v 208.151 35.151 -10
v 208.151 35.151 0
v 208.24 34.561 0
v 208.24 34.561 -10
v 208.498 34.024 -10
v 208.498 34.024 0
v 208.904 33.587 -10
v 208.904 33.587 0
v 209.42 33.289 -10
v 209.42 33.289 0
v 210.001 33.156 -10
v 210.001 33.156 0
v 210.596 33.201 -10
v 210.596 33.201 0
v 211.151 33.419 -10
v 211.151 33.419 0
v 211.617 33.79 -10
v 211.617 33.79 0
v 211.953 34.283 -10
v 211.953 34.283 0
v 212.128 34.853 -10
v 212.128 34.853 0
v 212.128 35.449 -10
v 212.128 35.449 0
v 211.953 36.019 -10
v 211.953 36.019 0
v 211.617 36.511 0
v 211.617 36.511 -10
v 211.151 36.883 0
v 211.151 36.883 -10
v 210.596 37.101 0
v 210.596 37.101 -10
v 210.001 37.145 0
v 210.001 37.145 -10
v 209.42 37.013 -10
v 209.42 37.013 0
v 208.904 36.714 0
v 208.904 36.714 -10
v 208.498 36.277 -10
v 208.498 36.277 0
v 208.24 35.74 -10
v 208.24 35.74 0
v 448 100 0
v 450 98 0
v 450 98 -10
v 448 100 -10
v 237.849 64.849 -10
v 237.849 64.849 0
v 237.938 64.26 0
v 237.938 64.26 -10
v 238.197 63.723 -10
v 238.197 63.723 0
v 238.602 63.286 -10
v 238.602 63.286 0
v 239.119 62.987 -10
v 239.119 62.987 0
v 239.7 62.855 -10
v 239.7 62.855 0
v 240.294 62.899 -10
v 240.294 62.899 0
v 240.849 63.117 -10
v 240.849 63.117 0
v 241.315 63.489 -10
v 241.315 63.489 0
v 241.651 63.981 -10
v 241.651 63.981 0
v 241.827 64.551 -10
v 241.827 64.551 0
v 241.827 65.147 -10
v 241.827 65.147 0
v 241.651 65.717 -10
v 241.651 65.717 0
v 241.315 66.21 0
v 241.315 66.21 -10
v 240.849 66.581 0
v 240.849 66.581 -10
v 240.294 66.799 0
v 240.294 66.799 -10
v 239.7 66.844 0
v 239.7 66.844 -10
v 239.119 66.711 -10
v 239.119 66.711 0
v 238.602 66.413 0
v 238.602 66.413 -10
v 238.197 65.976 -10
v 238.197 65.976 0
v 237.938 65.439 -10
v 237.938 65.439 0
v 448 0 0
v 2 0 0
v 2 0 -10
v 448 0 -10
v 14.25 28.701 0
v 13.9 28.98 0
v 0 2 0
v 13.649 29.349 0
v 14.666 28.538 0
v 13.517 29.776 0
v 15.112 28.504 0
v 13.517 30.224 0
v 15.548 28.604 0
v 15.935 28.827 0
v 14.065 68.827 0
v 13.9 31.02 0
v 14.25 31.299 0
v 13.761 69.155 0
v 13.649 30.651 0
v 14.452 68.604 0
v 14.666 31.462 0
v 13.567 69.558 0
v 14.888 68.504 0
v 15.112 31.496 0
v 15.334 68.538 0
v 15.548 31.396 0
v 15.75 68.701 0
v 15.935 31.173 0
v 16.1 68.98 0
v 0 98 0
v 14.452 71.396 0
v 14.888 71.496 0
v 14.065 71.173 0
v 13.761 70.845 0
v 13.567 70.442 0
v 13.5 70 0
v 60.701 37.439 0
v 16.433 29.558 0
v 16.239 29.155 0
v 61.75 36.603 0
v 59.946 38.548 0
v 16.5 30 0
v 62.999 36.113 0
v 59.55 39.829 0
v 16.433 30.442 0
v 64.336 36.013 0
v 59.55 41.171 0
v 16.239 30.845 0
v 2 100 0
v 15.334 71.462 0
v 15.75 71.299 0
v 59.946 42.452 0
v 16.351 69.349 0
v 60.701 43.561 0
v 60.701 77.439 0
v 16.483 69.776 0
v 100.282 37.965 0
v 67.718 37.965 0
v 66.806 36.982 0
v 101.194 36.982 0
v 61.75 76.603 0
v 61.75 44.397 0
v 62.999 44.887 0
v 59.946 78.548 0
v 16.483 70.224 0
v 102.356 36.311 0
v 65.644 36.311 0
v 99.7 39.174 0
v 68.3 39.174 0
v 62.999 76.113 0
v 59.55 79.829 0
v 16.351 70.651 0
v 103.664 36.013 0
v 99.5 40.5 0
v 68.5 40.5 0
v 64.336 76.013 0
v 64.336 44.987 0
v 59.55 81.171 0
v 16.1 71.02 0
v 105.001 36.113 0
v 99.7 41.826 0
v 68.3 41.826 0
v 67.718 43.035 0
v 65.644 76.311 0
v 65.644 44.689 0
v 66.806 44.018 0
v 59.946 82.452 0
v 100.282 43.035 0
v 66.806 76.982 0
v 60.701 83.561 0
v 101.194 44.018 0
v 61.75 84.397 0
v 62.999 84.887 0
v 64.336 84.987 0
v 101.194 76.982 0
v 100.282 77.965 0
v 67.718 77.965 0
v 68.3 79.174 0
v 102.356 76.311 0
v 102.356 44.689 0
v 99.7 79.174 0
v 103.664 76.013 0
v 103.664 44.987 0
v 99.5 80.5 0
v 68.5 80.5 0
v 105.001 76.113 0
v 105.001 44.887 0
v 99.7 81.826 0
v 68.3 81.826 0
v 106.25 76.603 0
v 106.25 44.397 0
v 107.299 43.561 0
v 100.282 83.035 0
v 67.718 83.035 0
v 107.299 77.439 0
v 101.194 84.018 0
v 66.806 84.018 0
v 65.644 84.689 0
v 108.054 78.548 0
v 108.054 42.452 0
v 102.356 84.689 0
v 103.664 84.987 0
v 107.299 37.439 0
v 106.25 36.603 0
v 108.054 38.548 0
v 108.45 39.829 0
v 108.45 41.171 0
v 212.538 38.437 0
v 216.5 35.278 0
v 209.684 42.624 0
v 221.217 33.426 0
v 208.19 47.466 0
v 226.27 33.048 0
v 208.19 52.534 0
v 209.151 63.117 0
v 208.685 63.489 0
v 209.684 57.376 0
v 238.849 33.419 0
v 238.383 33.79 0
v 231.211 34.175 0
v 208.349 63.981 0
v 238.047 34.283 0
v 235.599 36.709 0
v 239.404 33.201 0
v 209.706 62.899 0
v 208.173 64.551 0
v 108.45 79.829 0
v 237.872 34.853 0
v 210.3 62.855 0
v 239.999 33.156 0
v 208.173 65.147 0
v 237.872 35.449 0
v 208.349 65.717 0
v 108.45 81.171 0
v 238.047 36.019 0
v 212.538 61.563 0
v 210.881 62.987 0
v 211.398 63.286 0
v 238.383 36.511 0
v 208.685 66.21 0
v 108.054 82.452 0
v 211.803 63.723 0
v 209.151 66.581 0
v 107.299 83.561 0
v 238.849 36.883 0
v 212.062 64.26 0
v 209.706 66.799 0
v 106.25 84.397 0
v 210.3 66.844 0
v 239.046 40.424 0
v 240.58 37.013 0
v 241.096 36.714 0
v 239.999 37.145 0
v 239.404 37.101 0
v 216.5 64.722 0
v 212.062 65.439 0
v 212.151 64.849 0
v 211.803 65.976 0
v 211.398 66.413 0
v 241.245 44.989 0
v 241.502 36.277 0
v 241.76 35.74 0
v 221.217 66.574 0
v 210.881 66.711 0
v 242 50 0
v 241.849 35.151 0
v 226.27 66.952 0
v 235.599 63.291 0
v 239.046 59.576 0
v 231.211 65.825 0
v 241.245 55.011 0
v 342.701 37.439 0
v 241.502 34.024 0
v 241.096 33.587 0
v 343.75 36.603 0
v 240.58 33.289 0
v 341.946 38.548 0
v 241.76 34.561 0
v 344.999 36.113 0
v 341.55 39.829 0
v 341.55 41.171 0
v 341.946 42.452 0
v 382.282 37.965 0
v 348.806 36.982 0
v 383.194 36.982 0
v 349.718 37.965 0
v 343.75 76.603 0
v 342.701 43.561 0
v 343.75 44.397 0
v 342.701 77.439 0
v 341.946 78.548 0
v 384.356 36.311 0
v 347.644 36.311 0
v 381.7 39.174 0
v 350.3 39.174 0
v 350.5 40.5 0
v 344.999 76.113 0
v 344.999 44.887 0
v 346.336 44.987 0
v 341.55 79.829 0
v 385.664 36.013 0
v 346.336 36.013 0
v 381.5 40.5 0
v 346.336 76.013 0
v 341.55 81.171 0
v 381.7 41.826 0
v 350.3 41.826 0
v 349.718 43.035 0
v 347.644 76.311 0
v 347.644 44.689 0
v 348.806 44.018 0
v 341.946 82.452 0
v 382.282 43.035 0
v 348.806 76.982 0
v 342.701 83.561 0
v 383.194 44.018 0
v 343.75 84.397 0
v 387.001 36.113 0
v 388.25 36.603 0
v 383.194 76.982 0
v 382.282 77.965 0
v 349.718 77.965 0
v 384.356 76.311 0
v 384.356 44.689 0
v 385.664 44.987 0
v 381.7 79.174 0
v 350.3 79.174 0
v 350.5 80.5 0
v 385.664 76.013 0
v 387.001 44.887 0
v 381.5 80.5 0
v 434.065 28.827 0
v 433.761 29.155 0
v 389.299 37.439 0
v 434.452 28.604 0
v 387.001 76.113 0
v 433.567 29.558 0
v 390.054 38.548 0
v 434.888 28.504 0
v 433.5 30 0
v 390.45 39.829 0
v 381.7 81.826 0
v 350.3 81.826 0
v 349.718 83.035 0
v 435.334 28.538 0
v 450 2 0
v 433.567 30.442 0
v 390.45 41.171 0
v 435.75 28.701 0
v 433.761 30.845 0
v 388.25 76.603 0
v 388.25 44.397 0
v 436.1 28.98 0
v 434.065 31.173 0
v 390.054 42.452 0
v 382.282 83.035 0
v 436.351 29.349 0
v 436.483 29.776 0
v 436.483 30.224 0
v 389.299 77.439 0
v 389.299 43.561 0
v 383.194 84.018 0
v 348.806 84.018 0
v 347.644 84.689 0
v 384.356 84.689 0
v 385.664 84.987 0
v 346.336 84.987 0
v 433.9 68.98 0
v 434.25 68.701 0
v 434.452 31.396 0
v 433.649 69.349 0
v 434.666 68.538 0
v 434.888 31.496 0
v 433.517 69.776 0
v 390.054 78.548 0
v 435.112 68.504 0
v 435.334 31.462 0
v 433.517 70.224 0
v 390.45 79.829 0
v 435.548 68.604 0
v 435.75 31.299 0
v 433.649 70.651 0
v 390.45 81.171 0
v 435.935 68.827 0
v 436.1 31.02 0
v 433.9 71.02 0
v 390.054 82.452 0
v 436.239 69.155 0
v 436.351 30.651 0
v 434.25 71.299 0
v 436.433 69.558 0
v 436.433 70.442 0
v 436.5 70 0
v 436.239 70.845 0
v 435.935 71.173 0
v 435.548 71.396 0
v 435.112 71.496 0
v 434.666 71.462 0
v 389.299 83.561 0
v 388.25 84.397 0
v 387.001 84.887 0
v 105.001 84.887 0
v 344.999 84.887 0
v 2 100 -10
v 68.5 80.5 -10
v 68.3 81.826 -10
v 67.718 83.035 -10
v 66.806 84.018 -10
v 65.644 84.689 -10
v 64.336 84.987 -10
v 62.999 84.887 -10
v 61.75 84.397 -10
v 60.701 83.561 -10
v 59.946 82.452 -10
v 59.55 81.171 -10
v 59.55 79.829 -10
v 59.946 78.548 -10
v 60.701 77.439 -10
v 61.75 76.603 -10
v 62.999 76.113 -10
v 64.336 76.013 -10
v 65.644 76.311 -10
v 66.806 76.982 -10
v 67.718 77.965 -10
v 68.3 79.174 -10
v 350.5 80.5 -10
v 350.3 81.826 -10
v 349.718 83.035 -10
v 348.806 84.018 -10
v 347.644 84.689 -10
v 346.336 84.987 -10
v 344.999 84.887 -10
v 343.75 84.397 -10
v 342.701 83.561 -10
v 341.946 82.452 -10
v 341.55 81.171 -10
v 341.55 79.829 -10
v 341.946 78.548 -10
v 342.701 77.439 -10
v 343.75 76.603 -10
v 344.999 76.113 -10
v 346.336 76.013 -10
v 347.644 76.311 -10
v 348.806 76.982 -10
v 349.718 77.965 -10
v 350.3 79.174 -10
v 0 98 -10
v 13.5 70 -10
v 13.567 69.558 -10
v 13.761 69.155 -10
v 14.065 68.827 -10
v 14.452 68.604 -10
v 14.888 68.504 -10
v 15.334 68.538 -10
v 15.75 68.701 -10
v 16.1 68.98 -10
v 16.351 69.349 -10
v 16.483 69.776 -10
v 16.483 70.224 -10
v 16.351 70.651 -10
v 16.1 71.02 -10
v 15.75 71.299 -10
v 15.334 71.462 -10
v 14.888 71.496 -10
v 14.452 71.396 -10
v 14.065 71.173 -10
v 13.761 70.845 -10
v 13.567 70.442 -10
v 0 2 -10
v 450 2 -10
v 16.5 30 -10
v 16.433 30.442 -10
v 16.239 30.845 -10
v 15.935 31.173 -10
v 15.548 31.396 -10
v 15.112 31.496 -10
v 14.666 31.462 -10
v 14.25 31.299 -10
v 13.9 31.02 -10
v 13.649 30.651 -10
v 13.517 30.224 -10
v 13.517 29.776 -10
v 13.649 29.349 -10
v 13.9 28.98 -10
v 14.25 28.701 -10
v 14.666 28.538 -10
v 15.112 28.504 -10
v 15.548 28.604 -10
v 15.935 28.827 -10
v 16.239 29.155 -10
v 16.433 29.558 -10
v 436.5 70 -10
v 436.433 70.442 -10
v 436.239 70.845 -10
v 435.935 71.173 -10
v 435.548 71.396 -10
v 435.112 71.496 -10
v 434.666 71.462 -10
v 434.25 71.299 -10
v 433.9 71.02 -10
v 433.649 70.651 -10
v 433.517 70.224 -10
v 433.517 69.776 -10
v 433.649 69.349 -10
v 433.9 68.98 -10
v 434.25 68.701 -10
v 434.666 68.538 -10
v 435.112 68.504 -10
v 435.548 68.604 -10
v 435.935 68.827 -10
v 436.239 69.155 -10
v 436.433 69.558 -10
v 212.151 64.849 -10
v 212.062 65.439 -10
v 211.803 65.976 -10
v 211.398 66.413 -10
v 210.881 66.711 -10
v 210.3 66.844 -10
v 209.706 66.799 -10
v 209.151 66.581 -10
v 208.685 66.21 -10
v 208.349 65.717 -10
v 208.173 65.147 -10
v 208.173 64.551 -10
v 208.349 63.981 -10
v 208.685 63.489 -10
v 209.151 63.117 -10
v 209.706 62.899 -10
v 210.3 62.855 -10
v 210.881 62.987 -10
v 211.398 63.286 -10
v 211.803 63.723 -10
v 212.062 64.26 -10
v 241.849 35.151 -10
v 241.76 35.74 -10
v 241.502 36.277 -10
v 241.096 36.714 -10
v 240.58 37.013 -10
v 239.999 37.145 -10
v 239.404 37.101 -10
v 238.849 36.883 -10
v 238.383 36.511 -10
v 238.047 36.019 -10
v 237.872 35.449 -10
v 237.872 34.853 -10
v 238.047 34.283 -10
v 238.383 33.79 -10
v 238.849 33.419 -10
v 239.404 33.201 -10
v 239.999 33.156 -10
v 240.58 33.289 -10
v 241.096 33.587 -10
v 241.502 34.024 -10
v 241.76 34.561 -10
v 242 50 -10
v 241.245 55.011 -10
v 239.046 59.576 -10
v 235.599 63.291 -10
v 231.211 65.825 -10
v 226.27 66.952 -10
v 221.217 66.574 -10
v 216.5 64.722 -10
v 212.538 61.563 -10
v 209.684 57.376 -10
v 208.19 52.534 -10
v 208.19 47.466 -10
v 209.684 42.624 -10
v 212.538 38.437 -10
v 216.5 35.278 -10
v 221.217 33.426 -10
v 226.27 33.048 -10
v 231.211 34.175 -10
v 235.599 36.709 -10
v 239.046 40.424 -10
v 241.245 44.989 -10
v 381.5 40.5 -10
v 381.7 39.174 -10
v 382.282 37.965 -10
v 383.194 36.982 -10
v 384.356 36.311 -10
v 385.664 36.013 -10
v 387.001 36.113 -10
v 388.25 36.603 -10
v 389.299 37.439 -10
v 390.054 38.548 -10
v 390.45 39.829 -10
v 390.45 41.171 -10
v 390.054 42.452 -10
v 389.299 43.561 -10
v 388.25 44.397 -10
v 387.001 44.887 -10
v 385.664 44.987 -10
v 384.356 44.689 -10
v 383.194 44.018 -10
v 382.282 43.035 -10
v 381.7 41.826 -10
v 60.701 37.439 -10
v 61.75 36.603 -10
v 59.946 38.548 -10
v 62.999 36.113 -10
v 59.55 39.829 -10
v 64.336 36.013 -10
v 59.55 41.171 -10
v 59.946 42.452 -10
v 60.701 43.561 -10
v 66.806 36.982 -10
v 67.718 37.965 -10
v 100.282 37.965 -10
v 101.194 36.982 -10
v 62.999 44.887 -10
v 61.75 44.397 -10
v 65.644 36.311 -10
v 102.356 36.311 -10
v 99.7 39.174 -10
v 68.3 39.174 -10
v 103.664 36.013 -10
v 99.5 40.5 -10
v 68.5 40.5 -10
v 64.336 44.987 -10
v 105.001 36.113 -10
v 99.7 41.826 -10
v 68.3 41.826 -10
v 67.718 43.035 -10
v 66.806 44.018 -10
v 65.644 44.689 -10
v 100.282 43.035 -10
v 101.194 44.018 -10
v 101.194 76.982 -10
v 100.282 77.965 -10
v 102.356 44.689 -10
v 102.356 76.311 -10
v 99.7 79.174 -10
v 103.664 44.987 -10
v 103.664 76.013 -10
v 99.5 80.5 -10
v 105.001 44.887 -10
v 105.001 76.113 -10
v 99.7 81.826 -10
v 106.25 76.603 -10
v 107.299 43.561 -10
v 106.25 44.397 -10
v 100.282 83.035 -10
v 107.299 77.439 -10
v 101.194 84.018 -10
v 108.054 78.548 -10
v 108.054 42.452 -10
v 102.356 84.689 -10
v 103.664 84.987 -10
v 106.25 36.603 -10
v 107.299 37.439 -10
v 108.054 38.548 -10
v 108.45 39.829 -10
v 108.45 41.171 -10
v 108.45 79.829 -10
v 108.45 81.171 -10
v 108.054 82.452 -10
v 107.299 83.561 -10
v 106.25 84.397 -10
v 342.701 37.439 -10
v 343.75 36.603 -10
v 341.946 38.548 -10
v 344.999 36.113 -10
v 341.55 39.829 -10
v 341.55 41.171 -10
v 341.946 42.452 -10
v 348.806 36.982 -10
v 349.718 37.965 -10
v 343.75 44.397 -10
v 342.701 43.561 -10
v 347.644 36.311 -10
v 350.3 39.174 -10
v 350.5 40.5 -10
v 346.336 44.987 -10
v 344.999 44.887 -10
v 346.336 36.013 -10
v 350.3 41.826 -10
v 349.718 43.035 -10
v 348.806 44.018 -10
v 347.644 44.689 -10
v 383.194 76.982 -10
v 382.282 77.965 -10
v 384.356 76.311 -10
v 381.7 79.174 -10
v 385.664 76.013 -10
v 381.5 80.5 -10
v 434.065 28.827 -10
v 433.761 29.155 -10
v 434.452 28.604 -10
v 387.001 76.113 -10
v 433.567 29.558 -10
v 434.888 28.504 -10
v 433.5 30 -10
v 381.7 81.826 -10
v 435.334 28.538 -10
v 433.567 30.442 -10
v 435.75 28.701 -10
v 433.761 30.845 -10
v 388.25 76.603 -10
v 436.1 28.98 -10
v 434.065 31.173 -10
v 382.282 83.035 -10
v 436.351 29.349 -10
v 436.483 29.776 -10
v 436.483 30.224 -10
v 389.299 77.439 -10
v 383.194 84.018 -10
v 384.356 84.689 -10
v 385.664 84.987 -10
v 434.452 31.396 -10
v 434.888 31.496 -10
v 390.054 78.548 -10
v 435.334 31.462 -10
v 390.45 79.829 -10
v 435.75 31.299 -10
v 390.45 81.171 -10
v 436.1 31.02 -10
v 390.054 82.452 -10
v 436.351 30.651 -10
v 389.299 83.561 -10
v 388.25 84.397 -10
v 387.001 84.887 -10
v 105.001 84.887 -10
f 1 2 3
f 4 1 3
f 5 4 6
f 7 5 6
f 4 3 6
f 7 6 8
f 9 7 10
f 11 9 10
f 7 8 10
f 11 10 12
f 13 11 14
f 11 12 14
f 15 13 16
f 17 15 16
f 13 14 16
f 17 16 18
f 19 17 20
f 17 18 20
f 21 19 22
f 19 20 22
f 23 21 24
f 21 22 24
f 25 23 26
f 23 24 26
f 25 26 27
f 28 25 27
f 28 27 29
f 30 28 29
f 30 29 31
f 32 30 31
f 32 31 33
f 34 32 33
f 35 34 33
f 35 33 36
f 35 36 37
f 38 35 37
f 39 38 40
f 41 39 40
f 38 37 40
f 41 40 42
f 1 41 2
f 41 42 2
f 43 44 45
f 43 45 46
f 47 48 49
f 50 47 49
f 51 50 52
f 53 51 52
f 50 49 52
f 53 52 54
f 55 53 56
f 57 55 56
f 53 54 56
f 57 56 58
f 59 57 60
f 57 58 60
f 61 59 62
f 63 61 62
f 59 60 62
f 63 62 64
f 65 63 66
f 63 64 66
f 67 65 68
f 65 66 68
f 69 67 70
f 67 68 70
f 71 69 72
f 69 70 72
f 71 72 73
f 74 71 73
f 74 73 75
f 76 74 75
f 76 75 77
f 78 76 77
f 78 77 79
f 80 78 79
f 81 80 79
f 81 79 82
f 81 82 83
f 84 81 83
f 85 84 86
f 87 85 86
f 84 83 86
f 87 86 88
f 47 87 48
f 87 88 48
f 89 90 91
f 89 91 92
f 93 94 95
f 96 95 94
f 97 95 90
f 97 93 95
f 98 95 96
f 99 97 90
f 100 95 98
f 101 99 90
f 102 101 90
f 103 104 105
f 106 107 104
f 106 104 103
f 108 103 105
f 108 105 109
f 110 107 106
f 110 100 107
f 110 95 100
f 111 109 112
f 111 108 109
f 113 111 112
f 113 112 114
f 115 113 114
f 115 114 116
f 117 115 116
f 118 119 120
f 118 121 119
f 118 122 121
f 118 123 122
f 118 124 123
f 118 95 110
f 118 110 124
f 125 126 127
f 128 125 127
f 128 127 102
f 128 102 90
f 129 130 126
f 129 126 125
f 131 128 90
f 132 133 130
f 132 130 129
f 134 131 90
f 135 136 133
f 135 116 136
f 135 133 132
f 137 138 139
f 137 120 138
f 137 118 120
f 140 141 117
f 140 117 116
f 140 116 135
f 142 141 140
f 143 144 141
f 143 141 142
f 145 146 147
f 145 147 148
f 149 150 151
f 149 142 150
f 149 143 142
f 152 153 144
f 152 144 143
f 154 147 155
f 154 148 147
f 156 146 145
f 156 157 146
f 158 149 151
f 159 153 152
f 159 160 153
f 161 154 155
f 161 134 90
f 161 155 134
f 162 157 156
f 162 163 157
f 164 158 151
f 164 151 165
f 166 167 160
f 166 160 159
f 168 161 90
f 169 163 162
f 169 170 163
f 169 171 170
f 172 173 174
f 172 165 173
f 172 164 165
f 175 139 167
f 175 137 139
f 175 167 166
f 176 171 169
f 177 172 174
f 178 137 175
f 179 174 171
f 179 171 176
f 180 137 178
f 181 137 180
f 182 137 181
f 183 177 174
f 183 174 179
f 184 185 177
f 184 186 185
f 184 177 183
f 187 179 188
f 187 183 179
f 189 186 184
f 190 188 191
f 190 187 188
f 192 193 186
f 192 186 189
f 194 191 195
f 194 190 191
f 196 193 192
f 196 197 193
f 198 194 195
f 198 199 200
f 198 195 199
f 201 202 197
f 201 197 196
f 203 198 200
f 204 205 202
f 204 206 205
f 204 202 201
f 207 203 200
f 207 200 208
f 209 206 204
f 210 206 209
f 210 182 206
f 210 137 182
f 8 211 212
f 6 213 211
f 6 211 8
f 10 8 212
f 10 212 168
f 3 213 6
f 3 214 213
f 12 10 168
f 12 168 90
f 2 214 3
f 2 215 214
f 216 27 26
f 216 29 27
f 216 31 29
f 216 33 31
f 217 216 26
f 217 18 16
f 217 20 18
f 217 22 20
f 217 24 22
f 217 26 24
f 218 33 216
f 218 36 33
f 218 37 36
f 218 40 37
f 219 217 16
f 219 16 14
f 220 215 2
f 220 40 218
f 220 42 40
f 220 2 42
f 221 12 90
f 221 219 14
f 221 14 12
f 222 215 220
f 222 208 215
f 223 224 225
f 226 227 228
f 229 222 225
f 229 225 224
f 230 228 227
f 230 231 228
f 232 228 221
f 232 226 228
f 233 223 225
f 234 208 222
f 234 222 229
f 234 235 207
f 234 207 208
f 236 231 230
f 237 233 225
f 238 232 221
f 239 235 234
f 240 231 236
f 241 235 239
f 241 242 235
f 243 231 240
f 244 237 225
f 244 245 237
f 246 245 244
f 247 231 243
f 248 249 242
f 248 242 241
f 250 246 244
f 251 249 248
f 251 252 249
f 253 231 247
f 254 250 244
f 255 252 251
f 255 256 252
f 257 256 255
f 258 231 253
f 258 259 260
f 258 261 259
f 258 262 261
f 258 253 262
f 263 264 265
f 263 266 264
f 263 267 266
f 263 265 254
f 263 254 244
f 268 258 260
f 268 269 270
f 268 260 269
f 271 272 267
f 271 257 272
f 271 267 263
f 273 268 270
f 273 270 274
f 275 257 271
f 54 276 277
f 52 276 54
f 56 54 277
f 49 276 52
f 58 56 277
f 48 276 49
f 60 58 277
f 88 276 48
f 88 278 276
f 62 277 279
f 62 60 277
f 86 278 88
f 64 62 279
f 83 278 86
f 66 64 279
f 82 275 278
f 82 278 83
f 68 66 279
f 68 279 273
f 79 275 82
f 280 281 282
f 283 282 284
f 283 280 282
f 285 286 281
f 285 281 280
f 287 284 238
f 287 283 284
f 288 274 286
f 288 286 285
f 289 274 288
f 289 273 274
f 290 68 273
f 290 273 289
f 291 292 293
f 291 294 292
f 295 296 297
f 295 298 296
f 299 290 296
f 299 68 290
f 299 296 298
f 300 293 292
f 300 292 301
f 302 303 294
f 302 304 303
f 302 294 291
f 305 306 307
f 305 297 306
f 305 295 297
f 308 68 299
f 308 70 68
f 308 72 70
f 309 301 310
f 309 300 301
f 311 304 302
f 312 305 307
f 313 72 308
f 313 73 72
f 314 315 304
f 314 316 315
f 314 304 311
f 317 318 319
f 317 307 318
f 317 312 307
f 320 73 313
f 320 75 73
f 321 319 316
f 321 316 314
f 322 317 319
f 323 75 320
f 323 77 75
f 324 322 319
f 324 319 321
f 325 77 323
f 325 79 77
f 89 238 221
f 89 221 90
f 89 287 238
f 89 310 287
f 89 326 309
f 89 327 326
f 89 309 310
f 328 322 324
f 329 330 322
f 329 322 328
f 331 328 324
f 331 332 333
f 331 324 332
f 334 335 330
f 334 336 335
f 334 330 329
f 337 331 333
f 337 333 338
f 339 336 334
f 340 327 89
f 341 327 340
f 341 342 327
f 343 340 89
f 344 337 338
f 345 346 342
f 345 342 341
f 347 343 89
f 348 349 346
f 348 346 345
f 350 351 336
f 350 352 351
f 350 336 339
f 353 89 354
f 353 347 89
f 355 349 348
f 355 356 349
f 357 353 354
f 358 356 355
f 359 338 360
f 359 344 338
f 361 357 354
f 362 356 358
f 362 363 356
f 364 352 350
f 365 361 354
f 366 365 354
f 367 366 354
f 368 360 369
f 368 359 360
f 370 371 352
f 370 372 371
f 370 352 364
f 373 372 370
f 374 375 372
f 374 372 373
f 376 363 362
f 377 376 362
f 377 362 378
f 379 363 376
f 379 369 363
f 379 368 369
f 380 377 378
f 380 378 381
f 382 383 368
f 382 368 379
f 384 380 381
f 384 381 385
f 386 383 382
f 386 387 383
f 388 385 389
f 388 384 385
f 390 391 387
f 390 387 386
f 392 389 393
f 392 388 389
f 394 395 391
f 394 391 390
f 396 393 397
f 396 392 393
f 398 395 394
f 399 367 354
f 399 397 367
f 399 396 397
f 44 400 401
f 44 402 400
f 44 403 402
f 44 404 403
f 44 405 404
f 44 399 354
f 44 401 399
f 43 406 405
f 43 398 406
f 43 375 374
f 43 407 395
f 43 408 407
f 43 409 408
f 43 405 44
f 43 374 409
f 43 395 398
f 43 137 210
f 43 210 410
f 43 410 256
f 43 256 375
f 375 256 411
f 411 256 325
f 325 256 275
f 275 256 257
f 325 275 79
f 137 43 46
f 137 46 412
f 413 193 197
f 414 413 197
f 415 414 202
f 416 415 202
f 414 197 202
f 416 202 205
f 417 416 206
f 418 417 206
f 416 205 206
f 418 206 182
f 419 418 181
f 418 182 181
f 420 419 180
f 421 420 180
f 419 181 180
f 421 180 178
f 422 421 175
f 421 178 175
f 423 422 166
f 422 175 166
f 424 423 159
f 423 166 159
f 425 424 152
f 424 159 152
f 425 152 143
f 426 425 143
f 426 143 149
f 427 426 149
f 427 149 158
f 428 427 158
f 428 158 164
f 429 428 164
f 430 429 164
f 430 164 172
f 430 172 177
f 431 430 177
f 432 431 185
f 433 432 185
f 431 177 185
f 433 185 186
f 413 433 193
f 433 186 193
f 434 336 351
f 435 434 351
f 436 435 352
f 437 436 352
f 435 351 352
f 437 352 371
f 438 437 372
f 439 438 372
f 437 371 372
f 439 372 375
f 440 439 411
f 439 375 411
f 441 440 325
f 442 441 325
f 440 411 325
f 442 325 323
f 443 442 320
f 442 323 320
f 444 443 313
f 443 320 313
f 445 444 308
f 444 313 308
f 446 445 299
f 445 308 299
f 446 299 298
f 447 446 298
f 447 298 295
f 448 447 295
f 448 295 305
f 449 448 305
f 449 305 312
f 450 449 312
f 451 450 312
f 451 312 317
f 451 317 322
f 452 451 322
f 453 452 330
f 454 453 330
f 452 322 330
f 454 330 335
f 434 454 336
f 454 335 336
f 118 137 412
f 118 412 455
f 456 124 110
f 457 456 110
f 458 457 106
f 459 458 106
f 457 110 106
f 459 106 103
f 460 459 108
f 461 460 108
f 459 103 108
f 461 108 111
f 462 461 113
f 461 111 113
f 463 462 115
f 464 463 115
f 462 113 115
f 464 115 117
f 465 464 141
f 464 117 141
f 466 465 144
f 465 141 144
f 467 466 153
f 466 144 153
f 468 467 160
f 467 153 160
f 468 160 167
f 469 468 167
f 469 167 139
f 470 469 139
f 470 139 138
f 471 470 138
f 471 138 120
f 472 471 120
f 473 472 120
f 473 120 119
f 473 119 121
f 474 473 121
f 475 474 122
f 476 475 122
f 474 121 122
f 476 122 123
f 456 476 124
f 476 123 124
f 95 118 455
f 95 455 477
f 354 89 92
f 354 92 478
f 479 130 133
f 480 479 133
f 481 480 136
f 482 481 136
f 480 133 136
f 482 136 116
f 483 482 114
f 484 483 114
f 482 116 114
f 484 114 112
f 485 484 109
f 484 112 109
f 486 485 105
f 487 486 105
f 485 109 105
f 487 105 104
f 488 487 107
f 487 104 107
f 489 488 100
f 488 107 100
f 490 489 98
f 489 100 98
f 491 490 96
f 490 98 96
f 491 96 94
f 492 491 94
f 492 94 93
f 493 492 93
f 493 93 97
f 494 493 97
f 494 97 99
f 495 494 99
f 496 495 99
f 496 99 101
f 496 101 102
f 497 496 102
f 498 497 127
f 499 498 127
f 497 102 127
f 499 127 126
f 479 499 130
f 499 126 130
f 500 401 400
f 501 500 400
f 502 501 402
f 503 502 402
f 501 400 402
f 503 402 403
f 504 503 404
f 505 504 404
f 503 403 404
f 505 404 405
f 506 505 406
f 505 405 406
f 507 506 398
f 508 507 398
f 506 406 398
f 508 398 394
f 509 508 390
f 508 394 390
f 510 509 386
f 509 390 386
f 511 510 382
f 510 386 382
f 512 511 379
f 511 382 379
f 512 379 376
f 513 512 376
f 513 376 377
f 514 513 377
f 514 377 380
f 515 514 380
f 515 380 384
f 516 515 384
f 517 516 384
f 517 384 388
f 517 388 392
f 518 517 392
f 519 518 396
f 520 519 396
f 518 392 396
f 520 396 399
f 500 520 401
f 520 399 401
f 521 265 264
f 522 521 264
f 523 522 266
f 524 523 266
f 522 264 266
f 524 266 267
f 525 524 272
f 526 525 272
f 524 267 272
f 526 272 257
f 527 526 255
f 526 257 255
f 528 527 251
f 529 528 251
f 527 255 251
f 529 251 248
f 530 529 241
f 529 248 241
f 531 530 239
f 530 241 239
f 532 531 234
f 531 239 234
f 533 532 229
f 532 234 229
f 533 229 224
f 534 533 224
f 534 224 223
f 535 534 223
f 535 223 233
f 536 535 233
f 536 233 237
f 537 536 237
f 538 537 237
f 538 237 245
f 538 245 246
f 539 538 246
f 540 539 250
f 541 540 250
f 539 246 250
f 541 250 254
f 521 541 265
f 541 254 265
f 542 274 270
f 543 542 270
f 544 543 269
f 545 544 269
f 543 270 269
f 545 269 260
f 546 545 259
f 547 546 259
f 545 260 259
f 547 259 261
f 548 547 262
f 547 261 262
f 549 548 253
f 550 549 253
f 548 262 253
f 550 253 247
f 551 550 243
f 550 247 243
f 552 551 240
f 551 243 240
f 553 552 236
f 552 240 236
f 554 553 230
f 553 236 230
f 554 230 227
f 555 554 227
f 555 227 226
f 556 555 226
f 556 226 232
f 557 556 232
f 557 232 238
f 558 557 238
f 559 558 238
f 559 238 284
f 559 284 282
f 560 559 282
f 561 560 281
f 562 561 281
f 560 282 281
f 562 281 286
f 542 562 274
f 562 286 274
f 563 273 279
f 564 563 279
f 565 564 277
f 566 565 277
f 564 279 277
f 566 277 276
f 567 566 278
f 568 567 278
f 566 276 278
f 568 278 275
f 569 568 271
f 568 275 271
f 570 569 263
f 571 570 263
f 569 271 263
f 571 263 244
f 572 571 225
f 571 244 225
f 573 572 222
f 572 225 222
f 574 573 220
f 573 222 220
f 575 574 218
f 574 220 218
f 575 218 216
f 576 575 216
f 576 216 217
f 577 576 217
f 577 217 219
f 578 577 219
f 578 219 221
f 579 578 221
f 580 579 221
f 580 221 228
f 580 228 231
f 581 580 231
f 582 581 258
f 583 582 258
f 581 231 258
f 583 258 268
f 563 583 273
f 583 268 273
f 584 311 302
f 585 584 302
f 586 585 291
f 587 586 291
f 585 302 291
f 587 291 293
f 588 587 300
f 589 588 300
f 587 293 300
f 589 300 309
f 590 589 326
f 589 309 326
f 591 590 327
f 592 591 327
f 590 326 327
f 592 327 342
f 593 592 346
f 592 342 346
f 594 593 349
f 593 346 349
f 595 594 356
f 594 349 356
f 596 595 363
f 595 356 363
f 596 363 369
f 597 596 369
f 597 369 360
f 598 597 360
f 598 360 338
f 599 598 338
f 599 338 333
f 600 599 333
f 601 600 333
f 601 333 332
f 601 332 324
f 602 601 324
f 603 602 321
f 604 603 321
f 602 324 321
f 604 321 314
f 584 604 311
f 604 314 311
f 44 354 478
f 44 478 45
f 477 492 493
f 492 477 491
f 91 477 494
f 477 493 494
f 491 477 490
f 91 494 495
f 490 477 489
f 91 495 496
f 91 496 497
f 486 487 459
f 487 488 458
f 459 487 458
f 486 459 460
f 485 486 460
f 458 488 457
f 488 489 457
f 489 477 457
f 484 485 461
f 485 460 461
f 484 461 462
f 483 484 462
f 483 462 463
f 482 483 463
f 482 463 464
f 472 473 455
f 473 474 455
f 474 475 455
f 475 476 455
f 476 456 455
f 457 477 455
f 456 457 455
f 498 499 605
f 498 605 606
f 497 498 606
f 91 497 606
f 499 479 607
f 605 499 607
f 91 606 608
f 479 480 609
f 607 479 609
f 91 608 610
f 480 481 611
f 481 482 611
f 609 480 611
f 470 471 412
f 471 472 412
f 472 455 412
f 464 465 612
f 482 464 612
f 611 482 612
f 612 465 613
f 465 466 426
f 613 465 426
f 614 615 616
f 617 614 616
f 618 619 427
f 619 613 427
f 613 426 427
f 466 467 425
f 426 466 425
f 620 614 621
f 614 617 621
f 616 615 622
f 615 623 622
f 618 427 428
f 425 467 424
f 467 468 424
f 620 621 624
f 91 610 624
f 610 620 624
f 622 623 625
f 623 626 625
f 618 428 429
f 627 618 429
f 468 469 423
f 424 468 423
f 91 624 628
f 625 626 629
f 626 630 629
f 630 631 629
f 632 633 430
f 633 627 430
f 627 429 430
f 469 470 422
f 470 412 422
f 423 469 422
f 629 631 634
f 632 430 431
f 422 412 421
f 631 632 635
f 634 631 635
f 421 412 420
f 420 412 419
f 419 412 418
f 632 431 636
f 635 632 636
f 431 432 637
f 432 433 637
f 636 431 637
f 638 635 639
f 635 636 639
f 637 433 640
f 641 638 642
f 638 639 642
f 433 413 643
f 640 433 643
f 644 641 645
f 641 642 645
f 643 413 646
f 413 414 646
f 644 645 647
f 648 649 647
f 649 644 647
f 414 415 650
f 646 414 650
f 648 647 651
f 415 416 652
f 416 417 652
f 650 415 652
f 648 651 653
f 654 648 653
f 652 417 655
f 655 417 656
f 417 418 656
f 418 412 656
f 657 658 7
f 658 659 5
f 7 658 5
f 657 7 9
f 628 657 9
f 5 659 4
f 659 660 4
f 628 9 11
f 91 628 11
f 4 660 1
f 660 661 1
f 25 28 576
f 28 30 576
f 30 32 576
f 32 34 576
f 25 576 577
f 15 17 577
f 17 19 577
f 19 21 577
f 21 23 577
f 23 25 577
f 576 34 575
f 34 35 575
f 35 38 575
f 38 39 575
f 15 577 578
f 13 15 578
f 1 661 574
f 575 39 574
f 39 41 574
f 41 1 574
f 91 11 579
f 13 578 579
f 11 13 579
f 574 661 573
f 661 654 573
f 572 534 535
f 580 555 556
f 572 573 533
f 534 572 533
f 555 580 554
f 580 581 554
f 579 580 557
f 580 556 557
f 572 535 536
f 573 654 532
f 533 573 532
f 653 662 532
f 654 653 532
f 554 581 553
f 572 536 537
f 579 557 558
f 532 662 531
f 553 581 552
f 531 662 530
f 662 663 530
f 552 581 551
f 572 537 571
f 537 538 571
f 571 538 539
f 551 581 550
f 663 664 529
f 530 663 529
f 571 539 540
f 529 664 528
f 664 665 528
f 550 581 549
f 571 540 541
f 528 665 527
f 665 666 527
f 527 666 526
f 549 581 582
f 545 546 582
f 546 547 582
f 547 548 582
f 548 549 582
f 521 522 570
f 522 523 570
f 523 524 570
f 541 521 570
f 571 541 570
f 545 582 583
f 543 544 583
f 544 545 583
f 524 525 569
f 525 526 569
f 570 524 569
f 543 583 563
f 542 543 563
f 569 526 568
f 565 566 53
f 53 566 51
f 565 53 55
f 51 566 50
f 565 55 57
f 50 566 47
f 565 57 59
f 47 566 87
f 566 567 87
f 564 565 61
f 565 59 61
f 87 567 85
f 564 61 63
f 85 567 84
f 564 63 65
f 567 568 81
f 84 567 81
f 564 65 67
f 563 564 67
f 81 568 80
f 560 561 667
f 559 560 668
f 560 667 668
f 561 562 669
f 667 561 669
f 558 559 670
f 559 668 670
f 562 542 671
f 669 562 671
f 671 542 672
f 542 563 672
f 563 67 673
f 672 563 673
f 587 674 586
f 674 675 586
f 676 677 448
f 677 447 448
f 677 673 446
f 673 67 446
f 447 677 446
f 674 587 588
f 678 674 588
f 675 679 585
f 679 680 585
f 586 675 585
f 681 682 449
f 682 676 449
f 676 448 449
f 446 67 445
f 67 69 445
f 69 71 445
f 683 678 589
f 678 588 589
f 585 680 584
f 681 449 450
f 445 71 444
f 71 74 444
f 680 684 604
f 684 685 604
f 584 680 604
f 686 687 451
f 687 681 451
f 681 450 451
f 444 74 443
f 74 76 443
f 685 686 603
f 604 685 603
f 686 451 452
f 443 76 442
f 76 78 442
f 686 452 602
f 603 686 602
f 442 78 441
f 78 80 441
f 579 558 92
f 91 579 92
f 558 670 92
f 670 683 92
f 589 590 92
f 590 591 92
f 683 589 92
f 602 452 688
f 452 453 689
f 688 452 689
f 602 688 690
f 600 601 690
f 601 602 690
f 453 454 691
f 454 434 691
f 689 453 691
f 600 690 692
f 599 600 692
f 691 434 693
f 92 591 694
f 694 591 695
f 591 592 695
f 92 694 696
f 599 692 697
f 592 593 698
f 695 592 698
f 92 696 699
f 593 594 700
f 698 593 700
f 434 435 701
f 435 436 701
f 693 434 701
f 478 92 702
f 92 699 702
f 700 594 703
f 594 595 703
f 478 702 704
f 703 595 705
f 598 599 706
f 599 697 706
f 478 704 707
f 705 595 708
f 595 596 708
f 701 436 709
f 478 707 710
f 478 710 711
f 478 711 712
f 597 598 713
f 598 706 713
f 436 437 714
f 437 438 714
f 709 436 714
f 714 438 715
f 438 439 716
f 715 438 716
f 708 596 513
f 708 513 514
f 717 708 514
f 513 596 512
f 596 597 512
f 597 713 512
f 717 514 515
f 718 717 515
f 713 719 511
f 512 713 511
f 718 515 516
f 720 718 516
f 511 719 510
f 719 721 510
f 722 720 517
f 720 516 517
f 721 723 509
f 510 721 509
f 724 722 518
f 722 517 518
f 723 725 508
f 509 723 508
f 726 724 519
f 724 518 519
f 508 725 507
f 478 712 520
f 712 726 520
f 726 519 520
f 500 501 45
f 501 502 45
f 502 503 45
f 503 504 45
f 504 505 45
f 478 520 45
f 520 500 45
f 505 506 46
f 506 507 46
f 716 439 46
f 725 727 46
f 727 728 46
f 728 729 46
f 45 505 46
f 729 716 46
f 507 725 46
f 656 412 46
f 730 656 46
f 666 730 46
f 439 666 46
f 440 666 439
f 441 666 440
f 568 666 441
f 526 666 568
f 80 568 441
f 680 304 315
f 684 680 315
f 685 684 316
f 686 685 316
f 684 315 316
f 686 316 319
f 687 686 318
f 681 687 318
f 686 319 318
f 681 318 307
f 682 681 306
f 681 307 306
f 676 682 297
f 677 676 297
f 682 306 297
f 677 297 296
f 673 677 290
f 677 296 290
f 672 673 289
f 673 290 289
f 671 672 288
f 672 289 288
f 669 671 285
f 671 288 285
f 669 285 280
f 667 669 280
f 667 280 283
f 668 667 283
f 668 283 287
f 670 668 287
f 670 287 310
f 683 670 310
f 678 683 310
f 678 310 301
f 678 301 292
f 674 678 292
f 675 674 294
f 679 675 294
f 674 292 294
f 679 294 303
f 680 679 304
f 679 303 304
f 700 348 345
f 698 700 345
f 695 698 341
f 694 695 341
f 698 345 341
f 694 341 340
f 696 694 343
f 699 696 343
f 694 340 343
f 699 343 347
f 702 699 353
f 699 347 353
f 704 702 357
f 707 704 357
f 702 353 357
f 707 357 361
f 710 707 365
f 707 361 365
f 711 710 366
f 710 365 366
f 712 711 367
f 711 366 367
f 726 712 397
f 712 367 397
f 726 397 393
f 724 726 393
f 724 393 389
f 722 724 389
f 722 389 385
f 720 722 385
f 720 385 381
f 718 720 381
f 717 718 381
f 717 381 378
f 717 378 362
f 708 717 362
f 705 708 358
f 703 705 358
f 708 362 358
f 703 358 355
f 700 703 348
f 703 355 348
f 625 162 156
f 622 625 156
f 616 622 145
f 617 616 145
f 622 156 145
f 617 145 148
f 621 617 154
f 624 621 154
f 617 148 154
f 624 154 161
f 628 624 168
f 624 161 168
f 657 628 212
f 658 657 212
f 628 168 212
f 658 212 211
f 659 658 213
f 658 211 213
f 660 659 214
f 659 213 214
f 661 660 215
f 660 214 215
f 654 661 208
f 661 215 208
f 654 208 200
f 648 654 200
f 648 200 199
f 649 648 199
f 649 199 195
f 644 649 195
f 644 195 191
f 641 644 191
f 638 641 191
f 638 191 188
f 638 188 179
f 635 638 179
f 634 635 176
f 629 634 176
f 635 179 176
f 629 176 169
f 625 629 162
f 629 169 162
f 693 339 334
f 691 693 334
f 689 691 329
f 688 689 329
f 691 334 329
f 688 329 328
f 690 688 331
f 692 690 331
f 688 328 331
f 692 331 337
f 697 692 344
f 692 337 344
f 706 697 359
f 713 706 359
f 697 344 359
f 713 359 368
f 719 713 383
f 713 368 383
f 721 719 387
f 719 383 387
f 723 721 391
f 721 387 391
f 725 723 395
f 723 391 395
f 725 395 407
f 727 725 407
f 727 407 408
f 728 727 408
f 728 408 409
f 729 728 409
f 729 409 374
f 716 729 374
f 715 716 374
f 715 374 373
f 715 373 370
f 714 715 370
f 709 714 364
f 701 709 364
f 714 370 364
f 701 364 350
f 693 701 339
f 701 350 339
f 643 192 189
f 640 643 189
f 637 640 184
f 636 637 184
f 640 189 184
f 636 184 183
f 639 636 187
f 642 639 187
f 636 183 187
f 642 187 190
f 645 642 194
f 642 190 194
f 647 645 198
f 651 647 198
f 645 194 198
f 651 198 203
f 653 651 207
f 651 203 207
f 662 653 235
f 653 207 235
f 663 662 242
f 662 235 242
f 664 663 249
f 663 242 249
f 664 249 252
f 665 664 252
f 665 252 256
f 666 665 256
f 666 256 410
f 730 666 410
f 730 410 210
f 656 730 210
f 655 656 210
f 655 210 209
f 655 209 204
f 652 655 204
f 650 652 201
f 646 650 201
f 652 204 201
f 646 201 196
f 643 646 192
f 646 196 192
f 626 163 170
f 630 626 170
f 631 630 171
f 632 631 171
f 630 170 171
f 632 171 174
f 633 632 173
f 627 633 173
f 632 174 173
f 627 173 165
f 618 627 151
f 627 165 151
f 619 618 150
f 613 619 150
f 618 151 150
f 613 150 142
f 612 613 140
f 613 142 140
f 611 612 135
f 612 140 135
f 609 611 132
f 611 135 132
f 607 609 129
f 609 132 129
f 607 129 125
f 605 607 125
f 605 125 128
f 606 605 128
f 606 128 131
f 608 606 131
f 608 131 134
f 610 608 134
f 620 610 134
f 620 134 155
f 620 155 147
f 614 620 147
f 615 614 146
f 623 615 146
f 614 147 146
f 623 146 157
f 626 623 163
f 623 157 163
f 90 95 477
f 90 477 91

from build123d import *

# Parameters (mm, degrees)
SCHIZZO1_R                   = 17
SCHIZZO1_R_2                 = 2
SCHIZZO1_R_3                 = 4.5
SCHIZZO1_R_4                 = 1.5
ESTRUSIONE_ESTRUSIONE1_DEPTH = 10


with BuildPart() as part:
    # Schizzo1 → Estrusione-Estrusione1 (new body)
    with BuildSketch(Plane.XY):
        Polygon((2, 0), (448, 0), (450, 2), (450, 98), (448, 100), (2, 100), (0, 98), (0, 2), align=None)
        with Locations((225, 50)):
            Circle(SCHIZZO1_R, mode=Mode.SUBTRACT)
        with Locations(Location((239.849242405, 64.849242405, 0), (0, 0, 180))):
            Circle(SCHIZZO1_R_2, mode=Mode.SUBTRACT)
        with Locations(Location((104, 40.5, 0), (0, 0, 180))):
            Circle(SCHIZZO1_R_3, mode=Mode.SUBTRACT)
        with Locations((239.849242405, 35.150757595)):
            Circle(SCHIZZO1_R_2, mode=Mode.SUBTRACT)
        with Locations(Location((210.150757595, 35.150757595, 0), (0, 0, 180))):
            Circle(SCHIZZO1_R_2, mode=Mode.SUBTRACT)
        with Locations(Location((104, 80.5, 0), (0, 0, 180))):
            Circle(SCHIZZO1_R_3, mode=Mode.SUBTRACT)
        with Locations(Location((386, 40.5, 0), (0, 0, 180))):
            Circle(SCHIZZO1_R_3, mode=Mode.SUBTRACT)
        with Locations((64, 40.5)):
            Circle(SCHIZZO1_R_3, mode=Mode.SUBTRACT)
        with Locations((64, 80.5)):
            Circle(SCHIZZO1_R_3, mode=Mode.SUBTRACT)
        with Locations((346, 40.5)):
            Circle(SCHIZZO1_R_3, mode=Mode.SUBTRACT)
        with Locations((15, 30)):
            Circle(SCHIZZO1_R_4, mode=Mode.SUBTRACT)
        with Locations(Location((435, 30, 0), (0, 0, 180))):
            Circle(SCHIZZO1_R_4, mode=Mode.SUBTRACT)
        with Locations((210.150757595, 64.849242405)):
            Circle(SCHIZZO1_R_2, mode=Mode.SUBTRACT)
        with Locations((346, 80.5)):
            Circle(SCHIZZO1_R_3, mode=Mode.SUBTRACT)
        with Locations(Location((386, 80.5, 0), (0, 0, 180))):
            Circle(SCHIZZO1_R_3, mode=Mode.SUBTRACT)
        with Locations((435, 70)):
            Circle(SCHIZZO1_R_4, mode=Mode.SUBTRACT)
        with Locations(Location((15, 70, 0), (0, 0, 180))):
            Circle(SCHIZZO1_R_4, mode=Mode.SUBTRACT)
    extrude(amount=-ESTRUSIONE_ESTRUSIONE1_DEPTH)


solid = part.part
